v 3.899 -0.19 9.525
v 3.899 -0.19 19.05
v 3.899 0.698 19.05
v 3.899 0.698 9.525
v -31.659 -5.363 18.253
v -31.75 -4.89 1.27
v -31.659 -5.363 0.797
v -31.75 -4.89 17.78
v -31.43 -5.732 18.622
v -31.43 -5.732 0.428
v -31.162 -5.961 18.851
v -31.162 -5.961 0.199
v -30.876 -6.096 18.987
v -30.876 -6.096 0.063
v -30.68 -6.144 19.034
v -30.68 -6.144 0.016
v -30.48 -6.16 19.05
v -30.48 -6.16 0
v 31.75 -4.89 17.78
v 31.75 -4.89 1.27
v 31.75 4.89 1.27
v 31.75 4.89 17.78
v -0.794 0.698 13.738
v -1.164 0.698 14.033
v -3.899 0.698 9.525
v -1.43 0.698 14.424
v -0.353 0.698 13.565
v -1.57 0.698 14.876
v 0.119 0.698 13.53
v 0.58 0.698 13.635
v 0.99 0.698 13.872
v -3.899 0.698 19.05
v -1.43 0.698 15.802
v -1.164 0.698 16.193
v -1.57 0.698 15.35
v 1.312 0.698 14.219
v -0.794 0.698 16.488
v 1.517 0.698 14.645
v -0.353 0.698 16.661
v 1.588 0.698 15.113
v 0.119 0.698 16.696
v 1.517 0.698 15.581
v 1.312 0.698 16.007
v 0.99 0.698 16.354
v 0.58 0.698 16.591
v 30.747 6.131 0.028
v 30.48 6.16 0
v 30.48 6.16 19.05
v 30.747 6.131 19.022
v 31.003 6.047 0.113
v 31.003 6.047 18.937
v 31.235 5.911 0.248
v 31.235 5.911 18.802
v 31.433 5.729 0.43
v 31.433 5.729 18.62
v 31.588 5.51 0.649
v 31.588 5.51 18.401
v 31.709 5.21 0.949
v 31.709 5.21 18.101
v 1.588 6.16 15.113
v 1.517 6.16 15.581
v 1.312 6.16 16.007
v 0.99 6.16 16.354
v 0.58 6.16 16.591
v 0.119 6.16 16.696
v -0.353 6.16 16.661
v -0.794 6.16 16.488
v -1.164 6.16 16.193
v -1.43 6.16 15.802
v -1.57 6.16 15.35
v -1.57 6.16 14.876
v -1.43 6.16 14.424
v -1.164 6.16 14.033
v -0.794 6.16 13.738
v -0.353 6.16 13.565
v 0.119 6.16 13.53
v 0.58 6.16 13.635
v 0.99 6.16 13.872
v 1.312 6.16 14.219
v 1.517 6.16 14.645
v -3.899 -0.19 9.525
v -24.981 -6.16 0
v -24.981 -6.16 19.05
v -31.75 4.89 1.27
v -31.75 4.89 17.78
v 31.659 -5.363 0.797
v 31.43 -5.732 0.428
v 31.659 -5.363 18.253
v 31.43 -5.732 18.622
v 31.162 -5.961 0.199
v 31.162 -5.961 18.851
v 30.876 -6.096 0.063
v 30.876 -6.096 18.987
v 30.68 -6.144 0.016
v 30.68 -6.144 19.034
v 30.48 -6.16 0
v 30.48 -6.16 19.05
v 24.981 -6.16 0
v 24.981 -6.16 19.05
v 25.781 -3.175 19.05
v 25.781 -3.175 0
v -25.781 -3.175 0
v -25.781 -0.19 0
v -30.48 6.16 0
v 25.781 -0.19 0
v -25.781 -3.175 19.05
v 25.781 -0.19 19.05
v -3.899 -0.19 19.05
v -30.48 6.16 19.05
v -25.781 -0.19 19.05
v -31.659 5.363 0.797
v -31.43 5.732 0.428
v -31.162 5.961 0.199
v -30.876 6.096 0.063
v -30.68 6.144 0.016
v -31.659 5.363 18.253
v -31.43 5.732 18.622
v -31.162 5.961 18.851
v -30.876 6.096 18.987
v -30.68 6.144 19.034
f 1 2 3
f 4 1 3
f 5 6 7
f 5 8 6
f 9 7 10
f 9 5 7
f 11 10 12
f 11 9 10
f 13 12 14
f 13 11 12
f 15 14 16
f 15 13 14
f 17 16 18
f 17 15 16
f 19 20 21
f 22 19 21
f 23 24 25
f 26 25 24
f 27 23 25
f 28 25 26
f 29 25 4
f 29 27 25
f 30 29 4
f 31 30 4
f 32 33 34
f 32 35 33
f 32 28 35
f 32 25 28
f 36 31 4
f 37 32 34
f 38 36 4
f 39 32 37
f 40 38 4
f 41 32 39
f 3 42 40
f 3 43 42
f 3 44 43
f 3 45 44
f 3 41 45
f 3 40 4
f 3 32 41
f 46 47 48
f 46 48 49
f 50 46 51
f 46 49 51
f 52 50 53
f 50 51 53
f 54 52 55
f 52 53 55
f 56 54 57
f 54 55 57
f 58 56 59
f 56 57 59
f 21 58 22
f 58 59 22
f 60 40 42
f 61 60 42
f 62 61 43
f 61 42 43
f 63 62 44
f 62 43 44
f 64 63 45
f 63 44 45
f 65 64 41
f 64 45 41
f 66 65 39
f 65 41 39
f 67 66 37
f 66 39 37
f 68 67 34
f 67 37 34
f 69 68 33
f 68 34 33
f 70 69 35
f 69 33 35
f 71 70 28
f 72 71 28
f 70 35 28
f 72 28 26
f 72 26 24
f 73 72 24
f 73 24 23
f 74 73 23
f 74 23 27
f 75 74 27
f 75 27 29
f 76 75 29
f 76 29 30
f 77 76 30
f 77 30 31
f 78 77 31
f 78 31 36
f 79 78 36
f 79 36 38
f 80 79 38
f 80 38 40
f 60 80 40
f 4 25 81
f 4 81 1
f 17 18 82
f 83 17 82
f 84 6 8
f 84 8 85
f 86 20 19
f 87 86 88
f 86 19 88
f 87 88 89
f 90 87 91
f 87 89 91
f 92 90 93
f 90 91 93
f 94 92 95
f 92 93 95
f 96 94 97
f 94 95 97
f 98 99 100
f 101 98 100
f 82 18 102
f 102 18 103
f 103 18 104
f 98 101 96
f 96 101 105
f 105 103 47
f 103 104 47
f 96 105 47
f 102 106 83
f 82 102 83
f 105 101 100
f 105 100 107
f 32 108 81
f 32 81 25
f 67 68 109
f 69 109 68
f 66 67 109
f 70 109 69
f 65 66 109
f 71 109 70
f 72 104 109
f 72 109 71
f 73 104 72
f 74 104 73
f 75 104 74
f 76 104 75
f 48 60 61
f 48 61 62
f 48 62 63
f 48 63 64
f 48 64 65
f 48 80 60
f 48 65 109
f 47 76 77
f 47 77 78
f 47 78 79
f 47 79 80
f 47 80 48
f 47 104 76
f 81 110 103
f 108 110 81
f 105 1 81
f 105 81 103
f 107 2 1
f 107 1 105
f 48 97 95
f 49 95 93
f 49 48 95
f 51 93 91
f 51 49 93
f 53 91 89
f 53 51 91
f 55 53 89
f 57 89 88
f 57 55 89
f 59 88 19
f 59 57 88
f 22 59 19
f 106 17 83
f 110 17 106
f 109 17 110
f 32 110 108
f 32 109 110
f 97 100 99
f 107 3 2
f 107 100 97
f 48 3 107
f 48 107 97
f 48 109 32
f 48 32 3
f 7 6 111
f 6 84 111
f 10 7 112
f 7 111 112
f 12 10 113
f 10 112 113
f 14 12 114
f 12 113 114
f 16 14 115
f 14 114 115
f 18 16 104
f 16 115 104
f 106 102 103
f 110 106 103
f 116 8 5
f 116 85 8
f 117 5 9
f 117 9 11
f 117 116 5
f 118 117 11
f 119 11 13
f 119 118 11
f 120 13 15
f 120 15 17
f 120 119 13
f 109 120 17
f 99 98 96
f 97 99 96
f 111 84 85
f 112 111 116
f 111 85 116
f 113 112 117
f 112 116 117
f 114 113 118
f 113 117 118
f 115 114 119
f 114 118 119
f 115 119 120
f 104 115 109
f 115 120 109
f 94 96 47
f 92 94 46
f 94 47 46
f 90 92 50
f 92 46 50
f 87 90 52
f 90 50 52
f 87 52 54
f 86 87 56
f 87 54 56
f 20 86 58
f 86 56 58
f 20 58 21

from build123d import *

# Parameters (mm, degrees)
F0_W     = 63.5
F0_H     = 12.319
F1_DEPTH = 19.05
F2_W     = 51.562
F2_H     = 2.9845
F3_DEPTH = 25.4
F4_W     = 7.7978
F4_H     = 1.778
F5_DEPTH = 9.525
F6_R     = 1.5875
F7_DEPTH = 25.4
F8_R     = 1.27


with BuildPart() as f1:
    # F0 (on Top) → F1 (new body)
    with BuildSketch(Plane.XY):
        Rectangle(F0_W, F0_H)
    extrude(amount=F1_DEPTH)

    # F2 (on face) → F3 (cut)
    with BuildSketch(Plane.XY.offset(19.05)):
        Polygon((24.981306, -6.1595), (25.781, -3.175), (-25.781, -3.175), (-24.981306, -6.1595), (0, -6.1595), align=None)
        with Locations((0, -1.68275)):
            Rectangle(F2_W, F2_H)
    extrude(amount=-F3_DEPTH, mode=Mode.SUBTRACT)

    # F4 (on face) → F5 (cut)
    with BuildSketch(Plane.XY.offset(19.05)):
        with Locations((0, -0.1905)):
            Rectangle(F4_W, F4_H)
    extrude(amount=-F5_DEPTH, mode=Mode.SUBTRACT)

    # F6 (on face) → F7 (cut)
    with BuildSketch(Plane.XZ.offset(0.1905)):
        with Locations((0, 15.113)):
            Circle(F6_R)
    extrude(amount=-F7_DEPTH, mode=Mode.SUBTRACT)

    # F8
    f8_edges = [f1.edges().sort_by_distance(p)[0] for p in [
        (31.75, 6.1595, 9.525),
        (-31.75, 0, 0),
        (-31.75, -6.1595, 9.525),
        (31.75, -6.1595, 9.525),
        (31.75, 0, 0),
        (-31.75, 0, 19.05),
        (31.75, 0, 19.05),
        (-31.75, 6.1595, 9.525),
    ]]
    fillet(f8_edges, radius=F8_R)


solid = f1.part
